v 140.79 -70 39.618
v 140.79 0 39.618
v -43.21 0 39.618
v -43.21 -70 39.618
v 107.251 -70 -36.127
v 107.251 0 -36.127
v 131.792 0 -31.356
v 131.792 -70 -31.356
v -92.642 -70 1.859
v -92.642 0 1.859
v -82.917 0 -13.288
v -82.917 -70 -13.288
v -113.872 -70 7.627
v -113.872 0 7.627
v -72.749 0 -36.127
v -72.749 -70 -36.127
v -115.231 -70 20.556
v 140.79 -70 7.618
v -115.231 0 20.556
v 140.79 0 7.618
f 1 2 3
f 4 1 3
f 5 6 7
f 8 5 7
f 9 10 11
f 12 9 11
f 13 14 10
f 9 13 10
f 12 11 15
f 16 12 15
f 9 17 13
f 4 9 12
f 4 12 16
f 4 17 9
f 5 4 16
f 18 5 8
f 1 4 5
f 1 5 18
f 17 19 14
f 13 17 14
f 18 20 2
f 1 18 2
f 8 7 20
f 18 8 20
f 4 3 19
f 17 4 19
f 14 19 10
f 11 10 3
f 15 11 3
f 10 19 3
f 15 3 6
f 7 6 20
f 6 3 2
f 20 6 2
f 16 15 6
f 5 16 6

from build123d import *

# Parameters (mm, degrees)
F1_DEPTH = 70.000114


with BuildPart() as f1:
    # F0 (on Front) → F1 (new body)
    with BuildSketch(Plane.XZ):
        Polygon((140.789584, 39.61827), (-43.210302, 39.61827), (-115.23099, 20.556154), (-113.87212, 7.62737), (140.789584, 7.618334), align=None)
        Polygon((131.79156, -31.356391), (140.789584, 7.618334), (-113.87212, 7.62737), (-92.641751, 1.859206), (-82.917431, -13.287979), (-72.749014, -36.126616), (107.25088, -36.126616), align=None)
    extrude(amount=F1_DEPTH)


solid = f1.part
